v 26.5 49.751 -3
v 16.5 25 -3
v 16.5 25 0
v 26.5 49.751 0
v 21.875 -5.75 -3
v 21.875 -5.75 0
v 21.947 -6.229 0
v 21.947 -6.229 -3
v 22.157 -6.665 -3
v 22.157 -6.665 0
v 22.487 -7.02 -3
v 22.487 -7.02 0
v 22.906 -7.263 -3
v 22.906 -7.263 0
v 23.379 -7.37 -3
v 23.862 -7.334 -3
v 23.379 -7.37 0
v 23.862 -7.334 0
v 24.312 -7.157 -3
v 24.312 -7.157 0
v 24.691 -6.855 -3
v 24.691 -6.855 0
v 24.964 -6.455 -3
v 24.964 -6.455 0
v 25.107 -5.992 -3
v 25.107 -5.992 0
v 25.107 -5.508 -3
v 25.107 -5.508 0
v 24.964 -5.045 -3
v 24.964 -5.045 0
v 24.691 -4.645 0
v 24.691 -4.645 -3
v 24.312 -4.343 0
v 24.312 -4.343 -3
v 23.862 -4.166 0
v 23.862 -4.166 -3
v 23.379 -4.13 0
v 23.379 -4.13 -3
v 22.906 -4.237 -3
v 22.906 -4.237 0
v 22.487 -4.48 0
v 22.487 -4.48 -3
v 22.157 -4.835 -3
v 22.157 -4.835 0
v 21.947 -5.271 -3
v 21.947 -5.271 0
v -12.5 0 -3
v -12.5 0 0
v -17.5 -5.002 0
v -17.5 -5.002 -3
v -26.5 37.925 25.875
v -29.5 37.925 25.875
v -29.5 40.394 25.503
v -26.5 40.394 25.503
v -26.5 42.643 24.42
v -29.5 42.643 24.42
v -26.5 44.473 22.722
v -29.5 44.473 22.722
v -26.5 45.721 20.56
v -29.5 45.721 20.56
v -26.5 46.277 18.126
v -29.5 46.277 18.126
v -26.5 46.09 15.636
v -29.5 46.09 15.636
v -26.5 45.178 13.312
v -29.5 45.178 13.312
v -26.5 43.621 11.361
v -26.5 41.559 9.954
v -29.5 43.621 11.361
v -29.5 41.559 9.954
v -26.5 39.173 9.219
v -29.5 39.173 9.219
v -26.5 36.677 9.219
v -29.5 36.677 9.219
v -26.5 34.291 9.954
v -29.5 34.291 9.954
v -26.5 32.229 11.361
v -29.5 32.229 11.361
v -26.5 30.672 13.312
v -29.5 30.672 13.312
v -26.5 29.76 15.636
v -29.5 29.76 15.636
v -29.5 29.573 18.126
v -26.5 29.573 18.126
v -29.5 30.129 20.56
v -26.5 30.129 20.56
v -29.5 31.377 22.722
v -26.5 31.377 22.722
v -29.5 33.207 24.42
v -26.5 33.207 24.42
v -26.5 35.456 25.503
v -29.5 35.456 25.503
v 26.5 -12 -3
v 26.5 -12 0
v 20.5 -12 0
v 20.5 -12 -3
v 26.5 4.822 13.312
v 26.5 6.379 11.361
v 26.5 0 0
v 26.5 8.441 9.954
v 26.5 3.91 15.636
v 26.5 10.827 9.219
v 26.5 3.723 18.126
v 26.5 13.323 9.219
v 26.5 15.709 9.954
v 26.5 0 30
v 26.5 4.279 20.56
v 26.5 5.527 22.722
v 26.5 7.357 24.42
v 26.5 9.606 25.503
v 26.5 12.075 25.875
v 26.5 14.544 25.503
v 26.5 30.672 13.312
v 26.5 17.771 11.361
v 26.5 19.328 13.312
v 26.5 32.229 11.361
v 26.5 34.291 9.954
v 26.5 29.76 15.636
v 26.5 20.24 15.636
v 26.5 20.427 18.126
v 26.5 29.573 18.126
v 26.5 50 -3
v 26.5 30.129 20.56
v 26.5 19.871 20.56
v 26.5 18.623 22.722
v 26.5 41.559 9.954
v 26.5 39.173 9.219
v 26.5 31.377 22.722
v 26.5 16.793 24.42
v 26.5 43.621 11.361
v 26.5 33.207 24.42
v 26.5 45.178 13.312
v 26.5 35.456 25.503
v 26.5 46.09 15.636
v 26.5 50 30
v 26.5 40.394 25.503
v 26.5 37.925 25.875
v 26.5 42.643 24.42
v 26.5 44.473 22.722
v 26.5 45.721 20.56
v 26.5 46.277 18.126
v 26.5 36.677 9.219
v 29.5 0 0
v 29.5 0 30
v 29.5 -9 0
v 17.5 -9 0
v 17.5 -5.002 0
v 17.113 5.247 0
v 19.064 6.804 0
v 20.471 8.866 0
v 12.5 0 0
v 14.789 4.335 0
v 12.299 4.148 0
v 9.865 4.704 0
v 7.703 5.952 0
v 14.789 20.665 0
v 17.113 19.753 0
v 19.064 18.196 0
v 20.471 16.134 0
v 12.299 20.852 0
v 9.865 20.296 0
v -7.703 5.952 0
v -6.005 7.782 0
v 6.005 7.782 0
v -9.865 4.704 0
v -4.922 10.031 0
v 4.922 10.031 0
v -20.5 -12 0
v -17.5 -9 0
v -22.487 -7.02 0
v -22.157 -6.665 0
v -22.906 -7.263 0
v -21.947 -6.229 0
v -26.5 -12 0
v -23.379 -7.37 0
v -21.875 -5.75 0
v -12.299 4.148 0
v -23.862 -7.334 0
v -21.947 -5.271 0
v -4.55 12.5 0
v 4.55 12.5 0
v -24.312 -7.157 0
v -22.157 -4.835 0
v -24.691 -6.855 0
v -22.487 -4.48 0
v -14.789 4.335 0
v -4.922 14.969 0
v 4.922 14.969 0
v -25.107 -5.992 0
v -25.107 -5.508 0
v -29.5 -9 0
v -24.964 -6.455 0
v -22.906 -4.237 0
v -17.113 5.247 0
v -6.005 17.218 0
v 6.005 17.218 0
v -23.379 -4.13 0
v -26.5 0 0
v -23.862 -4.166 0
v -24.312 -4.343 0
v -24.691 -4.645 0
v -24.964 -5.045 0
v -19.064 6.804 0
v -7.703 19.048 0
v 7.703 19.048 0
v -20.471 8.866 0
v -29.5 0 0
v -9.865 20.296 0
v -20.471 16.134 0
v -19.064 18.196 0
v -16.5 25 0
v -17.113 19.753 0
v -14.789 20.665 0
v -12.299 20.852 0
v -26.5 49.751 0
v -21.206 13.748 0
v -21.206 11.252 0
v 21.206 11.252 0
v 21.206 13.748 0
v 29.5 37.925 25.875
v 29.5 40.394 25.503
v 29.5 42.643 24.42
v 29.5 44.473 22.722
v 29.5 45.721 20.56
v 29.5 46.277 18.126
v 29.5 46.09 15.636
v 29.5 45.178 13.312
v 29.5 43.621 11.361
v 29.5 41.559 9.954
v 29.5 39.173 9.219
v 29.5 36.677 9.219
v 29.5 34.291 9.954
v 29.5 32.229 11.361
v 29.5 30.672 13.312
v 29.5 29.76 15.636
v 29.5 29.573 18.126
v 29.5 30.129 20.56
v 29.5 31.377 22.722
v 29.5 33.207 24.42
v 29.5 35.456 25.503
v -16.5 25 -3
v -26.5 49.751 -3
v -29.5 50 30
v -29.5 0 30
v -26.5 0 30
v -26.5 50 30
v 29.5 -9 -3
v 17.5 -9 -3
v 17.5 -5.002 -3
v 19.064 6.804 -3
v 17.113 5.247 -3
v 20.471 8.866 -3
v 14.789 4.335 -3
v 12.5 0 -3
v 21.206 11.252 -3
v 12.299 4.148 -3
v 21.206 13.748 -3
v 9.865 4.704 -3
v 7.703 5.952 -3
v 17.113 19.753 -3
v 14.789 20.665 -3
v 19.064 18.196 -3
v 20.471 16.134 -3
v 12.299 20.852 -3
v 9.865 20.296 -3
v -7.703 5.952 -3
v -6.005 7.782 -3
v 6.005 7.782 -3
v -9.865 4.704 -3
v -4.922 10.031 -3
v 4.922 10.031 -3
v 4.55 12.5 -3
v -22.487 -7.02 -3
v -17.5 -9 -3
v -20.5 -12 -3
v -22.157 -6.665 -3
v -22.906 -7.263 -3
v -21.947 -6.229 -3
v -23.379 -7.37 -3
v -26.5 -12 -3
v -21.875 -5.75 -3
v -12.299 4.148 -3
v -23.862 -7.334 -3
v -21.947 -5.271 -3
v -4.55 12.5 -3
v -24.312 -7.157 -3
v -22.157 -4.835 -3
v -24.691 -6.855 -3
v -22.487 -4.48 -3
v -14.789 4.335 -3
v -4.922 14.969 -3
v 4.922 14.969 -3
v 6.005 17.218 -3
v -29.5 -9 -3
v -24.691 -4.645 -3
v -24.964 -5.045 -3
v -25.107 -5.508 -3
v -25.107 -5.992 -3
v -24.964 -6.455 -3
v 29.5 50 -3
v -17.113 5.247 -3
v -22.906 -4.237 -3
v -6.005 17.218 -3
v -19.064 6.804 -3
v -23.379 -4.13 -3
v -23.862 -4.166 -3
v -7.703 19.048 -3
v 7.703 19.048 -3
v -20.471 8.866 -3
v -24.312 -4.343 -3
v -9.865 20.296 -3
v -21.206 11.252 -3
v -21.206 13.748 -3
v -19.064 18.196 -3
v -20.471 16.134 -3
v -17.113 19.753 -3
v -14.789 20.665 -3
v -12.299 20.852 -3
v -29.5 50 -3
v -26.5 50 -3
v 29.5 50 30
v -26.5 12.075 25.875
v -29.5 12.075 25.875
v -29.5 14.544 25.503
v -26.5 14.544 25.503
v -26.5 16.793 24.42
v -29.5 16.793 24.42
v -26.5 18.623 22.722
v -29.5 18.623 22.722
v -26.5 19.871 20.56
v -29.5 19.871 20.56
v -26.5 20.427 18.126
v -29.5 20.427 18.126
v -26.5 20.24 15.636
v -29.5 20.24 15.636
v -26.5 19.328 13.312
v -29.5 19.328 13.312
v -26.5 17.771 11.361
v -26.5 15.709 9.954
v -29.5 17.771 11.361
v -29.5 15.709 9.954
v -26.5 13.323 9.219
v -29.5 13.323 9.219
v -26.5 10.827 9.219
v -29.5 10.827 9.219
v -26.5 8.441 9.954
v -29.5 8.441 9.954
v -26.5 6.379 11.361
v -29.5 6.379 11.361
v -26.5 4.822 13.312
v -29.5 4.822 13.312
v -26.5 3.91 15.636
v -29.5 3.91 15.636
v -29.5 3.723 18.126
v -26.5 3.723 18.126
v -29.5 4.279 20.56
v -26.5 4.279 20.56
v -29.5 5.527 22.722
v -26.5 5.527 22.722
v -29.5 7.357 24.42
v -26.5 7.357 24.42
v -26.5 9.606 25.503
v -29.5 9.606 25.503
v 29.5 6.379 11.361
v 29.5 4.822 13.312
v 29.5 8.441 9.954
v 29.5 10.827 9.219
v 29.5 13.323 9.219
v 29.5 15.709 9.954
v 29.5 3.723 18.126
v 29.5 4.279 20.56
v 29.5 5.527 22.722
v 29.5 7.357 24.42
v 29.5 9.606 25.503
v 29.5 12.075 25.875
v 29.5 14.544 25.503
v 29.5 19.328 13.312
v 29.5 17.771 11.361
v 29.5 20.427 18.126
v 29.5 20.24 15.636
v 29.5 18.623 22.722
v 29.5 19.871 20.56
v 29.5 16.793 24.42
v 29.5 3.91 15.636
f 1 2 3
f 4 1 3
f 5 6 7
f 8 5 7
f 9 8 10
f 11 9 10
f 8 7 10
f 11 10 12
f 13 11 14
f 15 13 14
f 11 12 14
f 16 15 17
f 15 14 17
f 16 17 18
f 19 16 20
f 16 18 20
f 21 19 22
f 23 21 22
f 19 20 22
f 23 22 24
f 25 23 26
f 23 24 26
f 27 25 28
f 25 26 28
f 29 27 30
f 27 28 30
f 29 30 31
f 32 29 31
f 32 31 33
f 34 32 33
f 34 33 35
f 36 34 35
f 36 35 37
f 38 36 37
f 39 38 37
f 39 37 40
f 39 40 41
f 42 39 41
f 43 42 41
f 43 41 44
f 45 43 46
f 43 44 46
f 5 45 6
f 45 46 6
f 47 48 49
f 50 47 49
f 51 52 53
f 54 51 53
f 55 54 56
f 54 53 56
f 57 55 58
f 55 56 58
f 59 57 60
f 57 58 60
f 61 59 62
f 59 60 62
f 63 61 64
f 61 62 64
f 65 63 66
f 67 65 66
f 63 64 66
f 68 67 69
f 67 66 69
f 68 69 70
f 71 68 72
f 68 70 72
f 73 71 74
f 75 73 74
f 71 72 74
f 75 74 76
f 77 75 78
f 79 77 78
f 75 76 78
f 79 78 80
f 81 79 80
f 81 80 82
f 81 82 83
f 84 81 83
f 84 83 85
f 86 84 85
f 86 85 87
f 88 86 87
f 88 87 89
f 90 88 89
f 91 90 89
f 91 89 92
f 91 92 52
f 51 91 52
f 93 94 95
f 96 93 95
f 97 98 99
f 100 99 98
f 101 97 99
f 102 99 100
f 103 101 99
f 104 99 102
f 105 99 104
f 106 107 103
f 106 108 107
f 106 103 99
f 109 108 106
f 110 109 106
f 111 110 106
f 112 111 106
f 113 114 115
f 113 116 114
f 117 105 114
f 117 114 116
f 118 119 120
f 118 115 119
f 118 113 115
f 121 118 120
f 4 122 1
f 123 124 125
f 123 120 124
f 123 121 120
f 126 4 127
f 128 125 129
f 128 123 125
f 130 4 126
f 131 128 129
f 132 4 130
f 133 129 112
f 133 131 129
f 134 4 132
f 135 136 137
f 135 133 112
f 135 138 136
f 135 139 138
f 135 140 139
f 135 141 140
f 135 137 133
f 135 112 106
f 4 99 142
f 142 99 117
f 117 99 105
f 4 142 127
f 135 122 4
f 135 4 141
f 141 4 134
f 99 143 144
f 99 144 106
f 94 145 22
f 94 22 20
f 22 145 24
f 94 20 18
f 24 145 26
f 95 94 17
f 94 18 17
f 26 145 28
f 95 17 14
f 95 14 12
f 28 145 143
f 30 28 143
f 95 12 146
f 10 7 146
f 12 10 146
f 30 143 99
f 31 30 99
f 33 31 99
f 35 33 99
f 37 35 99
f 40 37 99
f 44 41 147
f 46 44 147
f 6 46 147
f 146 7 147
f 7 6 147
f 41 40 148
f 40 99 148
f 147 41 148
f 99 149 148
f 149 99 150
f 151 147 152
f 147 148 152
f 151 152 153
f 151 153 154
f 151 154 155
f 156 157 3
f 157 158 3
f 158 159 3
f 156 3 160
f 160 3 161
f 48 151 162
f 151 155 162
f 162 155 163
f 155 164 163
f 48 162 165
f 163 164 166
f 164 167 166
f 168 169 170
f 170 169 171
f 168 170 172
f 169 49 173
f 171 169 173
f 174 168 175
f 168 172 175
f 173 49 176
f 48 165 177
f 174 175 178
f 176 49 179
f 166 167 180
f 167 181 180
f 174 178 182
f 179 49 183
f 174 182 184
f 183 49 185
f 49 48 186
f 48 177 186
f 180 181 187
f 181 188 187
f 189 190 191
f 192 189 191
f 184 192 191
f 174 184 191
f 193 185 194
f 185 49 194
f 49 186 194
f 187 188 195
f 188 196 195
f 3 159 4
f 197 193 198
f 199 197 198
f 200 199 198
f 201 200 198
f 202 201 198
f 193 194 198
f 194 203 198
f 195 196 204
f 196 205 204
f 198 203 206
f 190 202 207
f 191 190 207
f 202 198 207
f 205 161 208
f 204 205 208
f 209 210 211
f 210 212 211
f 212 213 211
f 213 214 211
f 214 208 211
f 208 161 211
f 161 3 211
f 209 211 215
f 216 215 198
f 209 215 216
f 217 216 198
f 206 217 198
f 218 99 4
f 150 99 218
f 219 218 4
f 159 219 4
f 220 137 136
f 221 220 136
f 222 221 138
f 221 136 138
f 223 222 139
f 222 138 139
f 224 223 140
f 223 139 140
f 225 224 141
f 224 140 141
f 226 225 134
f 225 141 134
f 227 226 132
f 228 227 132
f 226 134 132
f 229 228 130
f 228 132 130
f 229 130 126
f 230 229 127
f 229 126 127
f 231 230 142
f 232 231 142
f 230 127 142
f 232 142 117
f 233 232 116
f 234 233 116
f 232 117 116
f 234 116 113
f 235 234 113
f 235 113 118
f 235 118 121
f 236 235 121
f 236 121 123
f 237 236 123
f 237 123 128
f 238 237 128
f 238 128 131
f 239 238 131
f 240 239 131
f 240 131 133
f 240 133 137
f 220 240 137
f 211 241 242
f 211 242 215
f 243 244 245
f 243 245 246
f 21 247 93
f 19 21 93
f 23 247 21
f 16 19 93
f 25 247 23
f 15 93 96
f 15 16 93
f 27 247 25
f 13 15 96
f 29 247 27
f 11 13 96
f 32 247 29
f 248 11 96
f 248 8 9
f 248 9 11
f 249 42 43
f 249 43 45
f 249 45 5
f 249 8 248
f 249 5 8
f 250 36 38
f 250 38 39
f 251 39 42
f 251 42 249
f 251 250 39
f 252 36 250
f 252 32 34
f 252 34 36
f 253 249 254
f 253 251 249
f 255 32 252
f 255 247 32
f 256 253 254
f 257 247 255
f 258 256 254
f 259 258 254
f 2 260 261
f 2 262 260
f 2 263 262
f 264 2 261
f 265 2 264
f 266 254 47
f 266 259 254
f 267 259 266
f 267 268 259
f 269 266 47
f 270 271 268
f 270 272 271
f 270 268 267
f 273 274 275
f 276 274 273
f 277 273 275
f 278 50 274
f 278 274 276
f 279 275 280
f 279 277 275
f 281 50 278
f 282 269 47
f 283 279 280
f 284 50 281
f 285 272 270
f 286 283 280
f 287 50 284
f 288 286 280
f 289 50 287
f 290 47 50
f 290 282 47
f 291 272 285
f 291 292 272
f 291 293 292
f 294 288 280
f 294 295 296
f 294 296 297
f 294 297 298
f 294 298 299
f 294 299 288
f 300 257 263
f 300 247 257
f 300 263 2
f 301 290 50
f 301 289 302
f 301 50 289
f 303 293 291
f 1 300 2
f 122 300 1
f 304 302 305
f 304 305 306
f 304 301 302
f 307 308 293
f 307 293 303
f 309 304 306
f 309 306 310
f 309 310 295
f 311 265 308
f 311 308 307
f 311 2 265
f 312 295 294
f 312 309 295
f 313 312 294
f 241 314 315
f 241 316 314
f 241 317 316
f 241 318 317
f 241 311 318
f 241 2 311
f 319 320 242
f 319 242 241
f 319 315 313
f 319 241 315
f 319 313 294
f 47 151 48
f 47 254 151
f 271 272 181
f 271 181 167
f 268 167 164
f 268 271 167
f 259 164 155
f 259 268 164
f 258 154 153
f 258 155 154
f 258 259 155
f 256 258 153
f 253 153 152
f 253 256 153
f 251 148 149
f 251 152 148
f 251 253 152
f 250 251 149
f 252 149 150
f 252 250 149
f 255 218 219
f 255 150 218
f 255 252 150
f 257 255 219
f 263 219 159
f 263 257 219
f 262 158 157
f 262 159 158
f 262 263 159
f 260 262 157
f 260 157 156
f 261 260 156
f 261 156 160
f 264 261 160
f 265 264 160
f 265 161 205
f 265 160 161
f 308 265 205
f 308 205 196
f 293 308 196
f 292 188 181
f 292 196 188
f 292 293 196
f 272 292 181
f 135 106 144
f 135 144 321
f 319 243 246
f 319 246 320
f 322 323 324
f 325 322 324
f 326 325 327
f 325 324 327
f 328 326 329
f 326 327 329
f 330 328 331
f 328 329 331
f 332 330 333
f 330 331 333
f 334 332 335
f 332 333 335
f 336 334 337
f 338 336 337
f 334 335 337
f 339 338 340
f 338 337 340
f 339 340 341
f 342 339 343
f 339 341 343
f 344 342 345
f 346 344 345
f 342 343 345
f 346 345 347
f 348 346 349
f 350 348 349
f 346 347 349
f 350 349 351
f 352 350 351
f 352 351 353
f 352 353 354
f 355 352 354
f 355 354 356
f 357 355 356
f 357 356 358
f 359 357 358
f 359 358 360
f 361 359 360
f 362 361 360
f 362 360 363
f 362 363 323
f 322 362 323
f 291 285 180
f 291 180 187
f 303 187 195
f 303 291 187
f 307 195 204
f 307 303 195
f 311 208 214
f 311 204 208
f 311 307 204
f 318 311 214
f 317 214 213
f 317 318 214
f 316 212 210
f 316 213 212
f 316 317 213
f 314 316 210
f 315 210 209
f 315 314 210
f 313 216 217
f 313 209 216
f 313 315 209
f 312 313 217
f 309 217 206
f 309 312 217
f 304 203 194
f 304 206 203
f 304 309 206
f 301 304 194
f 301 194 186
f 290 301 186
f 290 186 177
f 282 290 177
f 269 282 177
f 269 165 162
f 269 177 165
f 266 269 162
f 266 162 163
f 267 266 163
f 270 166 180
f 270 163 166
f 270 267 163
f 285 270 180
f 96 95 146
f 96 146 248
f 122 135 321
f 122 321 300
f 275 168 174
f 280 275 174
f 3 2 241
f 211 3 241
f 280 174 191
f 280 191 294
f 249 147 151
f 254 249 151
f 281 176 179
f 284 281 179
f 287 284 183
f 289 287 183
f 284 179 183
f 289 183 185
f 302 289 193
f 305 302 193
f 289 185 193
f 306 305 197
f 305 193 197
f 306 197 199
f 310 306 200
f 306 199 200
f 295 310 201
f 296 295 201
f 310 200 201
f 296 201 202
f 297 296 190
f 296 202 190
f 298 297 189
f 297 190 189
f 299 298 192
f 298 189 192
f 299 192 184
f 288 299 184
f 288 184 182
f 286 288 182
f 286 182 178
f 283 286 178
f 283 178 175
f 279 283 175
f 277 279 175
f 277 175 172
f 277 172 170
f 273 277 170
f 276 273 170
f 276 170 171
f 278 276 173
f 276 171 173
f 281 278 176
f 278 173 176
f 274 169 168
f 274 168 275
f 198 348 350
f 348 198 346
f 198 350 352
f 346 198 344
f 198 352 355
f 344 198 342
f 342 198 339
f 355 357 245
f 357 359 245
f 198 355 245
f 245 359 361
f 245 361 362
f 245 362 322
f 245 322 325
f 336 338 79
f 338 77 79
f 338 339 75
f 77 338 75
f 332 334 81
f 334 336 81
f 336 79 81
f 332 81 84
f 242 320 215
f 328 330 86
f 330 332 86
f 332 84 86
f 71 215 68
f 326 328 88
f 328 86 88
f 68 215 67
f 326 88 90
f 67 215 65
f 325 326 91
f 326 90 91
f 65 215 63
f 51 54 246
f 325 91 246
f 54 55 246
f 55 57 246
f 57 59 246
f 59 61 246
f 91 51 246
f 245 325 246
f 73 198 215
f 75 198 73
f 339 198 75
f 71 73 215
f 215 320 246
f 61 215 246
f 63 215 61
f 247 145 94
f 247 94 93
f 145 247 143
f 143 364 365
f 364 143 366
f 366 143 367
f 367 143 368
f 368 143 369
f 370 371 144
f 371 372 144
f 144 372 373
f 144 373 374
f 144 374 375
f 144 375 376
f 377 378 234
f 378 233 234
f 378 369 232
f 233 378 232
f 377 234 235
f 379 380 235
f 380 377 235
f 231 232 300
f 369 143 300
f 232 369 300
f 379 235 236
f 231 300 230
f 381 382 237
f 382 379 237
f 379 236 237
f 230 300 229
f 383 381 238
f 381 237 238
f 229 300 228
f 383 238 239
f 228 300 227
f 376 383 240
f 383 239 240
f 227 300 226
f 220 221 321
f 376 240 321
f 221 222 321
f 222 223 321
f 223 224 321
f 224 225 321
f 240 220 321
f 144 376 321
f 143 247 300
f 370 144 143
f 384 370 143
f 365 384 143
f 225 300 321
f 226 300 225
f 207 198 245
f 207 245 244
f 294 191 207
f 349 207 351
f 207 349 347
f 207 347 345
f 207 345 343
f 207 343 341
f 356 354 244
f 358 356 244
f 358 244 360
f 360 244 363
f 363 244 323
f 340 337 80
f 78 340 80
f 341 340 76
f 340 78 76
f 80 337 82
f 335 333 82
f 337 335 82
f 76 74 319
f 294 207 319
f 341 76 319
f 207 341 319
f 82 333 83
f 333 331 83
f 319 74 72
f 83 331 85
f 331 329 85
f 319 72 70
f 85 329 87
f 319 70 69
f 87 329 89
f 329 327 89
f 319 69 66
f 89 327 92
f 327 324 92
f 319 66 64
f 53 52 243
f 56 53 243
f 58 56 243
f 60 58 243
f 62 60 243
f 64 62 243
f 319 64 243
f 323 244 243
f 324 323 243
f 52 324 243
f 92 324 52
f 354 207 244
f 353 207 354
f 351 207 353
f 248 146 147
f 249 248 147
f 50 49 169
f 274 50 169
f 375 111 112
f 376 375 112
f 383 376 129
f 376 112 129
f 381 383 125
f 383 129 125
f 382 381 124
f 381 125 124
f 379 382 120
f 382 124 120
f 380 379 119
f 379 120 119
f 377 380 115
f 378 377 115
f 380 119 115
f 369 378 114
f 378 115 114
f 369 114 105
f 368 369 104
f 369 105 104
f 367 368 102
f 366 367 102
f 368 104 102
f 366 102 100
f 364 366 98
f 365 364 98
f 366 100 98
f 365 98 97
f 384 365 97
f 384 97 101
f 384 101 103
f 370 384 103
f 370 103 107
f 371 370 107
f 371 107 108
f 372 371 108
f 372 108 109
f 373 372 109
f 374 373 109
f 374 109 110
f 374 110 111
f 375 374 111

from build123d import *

# Parameters (mm, degrees)
SALIENTE_EXTRUIR1_DEPTH    = 25
CORTAR_EXTRUIR1_DEPTH      = 49.94129136
CORTAR_EXTRUIR1_DEPTH_BACK = 49.94129136
CROQUIS2_R                 = 8.375
SALIENTE_EXTRUIR2_DEPTH    = 3
SALIENTE_EXTRUIR3_DEPTH    = 3
CROQUIS5_R                 = 8.375
CORTAR_EXTRUIR2_DEPTH      = 83.95179323
CHAFL_N1_SIZE              = 10
CHAFL_N1_SIZE2             = 24.750868534
CROQUIS6_R                 = 1.625
SALIENTE_EXTRUIR4_DEPTH    = 3
CHAFL_N2_SIZE              = 3


with BuildPart() as part:
    # Croquis1 → Saliente-Extruir1 (new body)
    with BuildSketch(Plane(origin=(0, 0, 0), x_dir=(1, 0, 0), z_dir=(0, 1, 0))):
        Polygon((-26.5, 0), (-26.5, -30), (-29.5, -30), (-29.5, 3), (29.5, 3), (29.5, -30), (26.5, -30), (26.5, 0), align=None)
    extrude(amount=SALIENTE_EXTRUIR1_DEPTH)

    # Croquis2 → Cortar-Extruir1 (cut, two sides: drawn at the far end of the back side and taken through both)
    with BuildSketch(Plane.XY.offset(-CORTAR_EXTRUIR1_DEPTH_BACK)):
        with Locations((-12.925, 12.5)):
            Circle(CROQUIS2_R)
        with Locations(Location((12.925, 12.5, 0), (0, 0, 180))):
            Circle(CROQUIS2_R)
    extrude(amount=CORTAR_EXTRUIR1_DEPTH + CORTAR_EXTRUIR1_DEPTH_BACK, mode=Mode.SUBTRACT)

    # Croquis3 → Saliente-Extruir2 (add)
    with BuildSketch(Plane.ZY.offset(-26.5)):
        Polygon((0, 25), (30, 25), (30, 50), (0, 50), (-3, 50), (-3, 25), align=None)
    extrude(amount=-SALIENTE_EXTRUIR2_DEPTH)

    # Croquis4 → Saliente-Extruir3 (add)
    with BuildSketch(Plane.ZY.offset(29.5)):
        Polygon((0, 25), (30, 25), (30, 50), (0, 50), (-3, 50), (-3, 25), align=None)
    extrude(amount=-SALIENTE_EXTRUIR3_DEPTH)

    # Croquis5 → Cortar-Extruir2 (cut, through all)
    with BuildSketch(Plane.ZY.offset(29.5)):
        with Locations((17.5, 37.925)):
            Circle(CROQUIS5_R)
        with Locations((17.5, 12.075)):
            Circle(CROQUIS5_R)
    extrude(amount=-CORTAR_EXTRUIR2_DEPTH, mode=Mode.SUBTRACT)

    # Chaflán1
    chafl_n1_edges = [part.edges().sort_by_distance(p)[0] for p in [
        (26.5, 25, -1.5),
        (-26.5, 25, -1.5),
    ]]
    chafl_n1_side = [part.faces().sort_by_distance(p)[0] for p in [
        (0, 25, -1.5),
    ]]
    chamfer(chafl_n1_edges, length=CHAFL_N1_SIZE, length2=CHAFL_N1_SIZE2, reference=chafl_n1_side[0])

    # Croquis6 → Saliente-Extruir4 (add)
    # profile 1 of 2: a face of its own
    with BuildSketch(Plane.XY):
        Polygon((-29.5, 0), (-17.5, 0), (-12.5, 0), (-17.5, -5.001983983), (-17.5, -12), (-29.5, -12), align=None)
        with Locations((-23.5, -5.75)):
            Circle(CROQUIS6_R, mode=Mode.SUBTRACT)
    # profile 2 of 2: a face of its own
    with BuildSketch(Plane.XY):
        Polygon((12.5, 0), (17.5, 0), (29.5, 0), (29.5, -12), (17.5, -12), (17.5, -5.001983983), align=None)
        with Locations(Location((23.5, -5.75, 0), (0, 0, 180))):
            Circle(CROQUIS6_R, mode=Mode.SUBTRACT)
    extrude(amount=-SALIENTE_EXTRUIR4_DEPTH)

    # Chaflán2
    chafl_n2_edges = [part.edges().sort_by_distance(p)[0] for p in [
        (-29.5, -12, -1.5),
        (-17.5, -12, -1.5),
        (29.5, -12, -1.5),
        (17.5, -12, -1.5),
    ]]
    chamfer(chafl_n2_edges, length=CHAFL_N2_SIZE)


solid = part.part
